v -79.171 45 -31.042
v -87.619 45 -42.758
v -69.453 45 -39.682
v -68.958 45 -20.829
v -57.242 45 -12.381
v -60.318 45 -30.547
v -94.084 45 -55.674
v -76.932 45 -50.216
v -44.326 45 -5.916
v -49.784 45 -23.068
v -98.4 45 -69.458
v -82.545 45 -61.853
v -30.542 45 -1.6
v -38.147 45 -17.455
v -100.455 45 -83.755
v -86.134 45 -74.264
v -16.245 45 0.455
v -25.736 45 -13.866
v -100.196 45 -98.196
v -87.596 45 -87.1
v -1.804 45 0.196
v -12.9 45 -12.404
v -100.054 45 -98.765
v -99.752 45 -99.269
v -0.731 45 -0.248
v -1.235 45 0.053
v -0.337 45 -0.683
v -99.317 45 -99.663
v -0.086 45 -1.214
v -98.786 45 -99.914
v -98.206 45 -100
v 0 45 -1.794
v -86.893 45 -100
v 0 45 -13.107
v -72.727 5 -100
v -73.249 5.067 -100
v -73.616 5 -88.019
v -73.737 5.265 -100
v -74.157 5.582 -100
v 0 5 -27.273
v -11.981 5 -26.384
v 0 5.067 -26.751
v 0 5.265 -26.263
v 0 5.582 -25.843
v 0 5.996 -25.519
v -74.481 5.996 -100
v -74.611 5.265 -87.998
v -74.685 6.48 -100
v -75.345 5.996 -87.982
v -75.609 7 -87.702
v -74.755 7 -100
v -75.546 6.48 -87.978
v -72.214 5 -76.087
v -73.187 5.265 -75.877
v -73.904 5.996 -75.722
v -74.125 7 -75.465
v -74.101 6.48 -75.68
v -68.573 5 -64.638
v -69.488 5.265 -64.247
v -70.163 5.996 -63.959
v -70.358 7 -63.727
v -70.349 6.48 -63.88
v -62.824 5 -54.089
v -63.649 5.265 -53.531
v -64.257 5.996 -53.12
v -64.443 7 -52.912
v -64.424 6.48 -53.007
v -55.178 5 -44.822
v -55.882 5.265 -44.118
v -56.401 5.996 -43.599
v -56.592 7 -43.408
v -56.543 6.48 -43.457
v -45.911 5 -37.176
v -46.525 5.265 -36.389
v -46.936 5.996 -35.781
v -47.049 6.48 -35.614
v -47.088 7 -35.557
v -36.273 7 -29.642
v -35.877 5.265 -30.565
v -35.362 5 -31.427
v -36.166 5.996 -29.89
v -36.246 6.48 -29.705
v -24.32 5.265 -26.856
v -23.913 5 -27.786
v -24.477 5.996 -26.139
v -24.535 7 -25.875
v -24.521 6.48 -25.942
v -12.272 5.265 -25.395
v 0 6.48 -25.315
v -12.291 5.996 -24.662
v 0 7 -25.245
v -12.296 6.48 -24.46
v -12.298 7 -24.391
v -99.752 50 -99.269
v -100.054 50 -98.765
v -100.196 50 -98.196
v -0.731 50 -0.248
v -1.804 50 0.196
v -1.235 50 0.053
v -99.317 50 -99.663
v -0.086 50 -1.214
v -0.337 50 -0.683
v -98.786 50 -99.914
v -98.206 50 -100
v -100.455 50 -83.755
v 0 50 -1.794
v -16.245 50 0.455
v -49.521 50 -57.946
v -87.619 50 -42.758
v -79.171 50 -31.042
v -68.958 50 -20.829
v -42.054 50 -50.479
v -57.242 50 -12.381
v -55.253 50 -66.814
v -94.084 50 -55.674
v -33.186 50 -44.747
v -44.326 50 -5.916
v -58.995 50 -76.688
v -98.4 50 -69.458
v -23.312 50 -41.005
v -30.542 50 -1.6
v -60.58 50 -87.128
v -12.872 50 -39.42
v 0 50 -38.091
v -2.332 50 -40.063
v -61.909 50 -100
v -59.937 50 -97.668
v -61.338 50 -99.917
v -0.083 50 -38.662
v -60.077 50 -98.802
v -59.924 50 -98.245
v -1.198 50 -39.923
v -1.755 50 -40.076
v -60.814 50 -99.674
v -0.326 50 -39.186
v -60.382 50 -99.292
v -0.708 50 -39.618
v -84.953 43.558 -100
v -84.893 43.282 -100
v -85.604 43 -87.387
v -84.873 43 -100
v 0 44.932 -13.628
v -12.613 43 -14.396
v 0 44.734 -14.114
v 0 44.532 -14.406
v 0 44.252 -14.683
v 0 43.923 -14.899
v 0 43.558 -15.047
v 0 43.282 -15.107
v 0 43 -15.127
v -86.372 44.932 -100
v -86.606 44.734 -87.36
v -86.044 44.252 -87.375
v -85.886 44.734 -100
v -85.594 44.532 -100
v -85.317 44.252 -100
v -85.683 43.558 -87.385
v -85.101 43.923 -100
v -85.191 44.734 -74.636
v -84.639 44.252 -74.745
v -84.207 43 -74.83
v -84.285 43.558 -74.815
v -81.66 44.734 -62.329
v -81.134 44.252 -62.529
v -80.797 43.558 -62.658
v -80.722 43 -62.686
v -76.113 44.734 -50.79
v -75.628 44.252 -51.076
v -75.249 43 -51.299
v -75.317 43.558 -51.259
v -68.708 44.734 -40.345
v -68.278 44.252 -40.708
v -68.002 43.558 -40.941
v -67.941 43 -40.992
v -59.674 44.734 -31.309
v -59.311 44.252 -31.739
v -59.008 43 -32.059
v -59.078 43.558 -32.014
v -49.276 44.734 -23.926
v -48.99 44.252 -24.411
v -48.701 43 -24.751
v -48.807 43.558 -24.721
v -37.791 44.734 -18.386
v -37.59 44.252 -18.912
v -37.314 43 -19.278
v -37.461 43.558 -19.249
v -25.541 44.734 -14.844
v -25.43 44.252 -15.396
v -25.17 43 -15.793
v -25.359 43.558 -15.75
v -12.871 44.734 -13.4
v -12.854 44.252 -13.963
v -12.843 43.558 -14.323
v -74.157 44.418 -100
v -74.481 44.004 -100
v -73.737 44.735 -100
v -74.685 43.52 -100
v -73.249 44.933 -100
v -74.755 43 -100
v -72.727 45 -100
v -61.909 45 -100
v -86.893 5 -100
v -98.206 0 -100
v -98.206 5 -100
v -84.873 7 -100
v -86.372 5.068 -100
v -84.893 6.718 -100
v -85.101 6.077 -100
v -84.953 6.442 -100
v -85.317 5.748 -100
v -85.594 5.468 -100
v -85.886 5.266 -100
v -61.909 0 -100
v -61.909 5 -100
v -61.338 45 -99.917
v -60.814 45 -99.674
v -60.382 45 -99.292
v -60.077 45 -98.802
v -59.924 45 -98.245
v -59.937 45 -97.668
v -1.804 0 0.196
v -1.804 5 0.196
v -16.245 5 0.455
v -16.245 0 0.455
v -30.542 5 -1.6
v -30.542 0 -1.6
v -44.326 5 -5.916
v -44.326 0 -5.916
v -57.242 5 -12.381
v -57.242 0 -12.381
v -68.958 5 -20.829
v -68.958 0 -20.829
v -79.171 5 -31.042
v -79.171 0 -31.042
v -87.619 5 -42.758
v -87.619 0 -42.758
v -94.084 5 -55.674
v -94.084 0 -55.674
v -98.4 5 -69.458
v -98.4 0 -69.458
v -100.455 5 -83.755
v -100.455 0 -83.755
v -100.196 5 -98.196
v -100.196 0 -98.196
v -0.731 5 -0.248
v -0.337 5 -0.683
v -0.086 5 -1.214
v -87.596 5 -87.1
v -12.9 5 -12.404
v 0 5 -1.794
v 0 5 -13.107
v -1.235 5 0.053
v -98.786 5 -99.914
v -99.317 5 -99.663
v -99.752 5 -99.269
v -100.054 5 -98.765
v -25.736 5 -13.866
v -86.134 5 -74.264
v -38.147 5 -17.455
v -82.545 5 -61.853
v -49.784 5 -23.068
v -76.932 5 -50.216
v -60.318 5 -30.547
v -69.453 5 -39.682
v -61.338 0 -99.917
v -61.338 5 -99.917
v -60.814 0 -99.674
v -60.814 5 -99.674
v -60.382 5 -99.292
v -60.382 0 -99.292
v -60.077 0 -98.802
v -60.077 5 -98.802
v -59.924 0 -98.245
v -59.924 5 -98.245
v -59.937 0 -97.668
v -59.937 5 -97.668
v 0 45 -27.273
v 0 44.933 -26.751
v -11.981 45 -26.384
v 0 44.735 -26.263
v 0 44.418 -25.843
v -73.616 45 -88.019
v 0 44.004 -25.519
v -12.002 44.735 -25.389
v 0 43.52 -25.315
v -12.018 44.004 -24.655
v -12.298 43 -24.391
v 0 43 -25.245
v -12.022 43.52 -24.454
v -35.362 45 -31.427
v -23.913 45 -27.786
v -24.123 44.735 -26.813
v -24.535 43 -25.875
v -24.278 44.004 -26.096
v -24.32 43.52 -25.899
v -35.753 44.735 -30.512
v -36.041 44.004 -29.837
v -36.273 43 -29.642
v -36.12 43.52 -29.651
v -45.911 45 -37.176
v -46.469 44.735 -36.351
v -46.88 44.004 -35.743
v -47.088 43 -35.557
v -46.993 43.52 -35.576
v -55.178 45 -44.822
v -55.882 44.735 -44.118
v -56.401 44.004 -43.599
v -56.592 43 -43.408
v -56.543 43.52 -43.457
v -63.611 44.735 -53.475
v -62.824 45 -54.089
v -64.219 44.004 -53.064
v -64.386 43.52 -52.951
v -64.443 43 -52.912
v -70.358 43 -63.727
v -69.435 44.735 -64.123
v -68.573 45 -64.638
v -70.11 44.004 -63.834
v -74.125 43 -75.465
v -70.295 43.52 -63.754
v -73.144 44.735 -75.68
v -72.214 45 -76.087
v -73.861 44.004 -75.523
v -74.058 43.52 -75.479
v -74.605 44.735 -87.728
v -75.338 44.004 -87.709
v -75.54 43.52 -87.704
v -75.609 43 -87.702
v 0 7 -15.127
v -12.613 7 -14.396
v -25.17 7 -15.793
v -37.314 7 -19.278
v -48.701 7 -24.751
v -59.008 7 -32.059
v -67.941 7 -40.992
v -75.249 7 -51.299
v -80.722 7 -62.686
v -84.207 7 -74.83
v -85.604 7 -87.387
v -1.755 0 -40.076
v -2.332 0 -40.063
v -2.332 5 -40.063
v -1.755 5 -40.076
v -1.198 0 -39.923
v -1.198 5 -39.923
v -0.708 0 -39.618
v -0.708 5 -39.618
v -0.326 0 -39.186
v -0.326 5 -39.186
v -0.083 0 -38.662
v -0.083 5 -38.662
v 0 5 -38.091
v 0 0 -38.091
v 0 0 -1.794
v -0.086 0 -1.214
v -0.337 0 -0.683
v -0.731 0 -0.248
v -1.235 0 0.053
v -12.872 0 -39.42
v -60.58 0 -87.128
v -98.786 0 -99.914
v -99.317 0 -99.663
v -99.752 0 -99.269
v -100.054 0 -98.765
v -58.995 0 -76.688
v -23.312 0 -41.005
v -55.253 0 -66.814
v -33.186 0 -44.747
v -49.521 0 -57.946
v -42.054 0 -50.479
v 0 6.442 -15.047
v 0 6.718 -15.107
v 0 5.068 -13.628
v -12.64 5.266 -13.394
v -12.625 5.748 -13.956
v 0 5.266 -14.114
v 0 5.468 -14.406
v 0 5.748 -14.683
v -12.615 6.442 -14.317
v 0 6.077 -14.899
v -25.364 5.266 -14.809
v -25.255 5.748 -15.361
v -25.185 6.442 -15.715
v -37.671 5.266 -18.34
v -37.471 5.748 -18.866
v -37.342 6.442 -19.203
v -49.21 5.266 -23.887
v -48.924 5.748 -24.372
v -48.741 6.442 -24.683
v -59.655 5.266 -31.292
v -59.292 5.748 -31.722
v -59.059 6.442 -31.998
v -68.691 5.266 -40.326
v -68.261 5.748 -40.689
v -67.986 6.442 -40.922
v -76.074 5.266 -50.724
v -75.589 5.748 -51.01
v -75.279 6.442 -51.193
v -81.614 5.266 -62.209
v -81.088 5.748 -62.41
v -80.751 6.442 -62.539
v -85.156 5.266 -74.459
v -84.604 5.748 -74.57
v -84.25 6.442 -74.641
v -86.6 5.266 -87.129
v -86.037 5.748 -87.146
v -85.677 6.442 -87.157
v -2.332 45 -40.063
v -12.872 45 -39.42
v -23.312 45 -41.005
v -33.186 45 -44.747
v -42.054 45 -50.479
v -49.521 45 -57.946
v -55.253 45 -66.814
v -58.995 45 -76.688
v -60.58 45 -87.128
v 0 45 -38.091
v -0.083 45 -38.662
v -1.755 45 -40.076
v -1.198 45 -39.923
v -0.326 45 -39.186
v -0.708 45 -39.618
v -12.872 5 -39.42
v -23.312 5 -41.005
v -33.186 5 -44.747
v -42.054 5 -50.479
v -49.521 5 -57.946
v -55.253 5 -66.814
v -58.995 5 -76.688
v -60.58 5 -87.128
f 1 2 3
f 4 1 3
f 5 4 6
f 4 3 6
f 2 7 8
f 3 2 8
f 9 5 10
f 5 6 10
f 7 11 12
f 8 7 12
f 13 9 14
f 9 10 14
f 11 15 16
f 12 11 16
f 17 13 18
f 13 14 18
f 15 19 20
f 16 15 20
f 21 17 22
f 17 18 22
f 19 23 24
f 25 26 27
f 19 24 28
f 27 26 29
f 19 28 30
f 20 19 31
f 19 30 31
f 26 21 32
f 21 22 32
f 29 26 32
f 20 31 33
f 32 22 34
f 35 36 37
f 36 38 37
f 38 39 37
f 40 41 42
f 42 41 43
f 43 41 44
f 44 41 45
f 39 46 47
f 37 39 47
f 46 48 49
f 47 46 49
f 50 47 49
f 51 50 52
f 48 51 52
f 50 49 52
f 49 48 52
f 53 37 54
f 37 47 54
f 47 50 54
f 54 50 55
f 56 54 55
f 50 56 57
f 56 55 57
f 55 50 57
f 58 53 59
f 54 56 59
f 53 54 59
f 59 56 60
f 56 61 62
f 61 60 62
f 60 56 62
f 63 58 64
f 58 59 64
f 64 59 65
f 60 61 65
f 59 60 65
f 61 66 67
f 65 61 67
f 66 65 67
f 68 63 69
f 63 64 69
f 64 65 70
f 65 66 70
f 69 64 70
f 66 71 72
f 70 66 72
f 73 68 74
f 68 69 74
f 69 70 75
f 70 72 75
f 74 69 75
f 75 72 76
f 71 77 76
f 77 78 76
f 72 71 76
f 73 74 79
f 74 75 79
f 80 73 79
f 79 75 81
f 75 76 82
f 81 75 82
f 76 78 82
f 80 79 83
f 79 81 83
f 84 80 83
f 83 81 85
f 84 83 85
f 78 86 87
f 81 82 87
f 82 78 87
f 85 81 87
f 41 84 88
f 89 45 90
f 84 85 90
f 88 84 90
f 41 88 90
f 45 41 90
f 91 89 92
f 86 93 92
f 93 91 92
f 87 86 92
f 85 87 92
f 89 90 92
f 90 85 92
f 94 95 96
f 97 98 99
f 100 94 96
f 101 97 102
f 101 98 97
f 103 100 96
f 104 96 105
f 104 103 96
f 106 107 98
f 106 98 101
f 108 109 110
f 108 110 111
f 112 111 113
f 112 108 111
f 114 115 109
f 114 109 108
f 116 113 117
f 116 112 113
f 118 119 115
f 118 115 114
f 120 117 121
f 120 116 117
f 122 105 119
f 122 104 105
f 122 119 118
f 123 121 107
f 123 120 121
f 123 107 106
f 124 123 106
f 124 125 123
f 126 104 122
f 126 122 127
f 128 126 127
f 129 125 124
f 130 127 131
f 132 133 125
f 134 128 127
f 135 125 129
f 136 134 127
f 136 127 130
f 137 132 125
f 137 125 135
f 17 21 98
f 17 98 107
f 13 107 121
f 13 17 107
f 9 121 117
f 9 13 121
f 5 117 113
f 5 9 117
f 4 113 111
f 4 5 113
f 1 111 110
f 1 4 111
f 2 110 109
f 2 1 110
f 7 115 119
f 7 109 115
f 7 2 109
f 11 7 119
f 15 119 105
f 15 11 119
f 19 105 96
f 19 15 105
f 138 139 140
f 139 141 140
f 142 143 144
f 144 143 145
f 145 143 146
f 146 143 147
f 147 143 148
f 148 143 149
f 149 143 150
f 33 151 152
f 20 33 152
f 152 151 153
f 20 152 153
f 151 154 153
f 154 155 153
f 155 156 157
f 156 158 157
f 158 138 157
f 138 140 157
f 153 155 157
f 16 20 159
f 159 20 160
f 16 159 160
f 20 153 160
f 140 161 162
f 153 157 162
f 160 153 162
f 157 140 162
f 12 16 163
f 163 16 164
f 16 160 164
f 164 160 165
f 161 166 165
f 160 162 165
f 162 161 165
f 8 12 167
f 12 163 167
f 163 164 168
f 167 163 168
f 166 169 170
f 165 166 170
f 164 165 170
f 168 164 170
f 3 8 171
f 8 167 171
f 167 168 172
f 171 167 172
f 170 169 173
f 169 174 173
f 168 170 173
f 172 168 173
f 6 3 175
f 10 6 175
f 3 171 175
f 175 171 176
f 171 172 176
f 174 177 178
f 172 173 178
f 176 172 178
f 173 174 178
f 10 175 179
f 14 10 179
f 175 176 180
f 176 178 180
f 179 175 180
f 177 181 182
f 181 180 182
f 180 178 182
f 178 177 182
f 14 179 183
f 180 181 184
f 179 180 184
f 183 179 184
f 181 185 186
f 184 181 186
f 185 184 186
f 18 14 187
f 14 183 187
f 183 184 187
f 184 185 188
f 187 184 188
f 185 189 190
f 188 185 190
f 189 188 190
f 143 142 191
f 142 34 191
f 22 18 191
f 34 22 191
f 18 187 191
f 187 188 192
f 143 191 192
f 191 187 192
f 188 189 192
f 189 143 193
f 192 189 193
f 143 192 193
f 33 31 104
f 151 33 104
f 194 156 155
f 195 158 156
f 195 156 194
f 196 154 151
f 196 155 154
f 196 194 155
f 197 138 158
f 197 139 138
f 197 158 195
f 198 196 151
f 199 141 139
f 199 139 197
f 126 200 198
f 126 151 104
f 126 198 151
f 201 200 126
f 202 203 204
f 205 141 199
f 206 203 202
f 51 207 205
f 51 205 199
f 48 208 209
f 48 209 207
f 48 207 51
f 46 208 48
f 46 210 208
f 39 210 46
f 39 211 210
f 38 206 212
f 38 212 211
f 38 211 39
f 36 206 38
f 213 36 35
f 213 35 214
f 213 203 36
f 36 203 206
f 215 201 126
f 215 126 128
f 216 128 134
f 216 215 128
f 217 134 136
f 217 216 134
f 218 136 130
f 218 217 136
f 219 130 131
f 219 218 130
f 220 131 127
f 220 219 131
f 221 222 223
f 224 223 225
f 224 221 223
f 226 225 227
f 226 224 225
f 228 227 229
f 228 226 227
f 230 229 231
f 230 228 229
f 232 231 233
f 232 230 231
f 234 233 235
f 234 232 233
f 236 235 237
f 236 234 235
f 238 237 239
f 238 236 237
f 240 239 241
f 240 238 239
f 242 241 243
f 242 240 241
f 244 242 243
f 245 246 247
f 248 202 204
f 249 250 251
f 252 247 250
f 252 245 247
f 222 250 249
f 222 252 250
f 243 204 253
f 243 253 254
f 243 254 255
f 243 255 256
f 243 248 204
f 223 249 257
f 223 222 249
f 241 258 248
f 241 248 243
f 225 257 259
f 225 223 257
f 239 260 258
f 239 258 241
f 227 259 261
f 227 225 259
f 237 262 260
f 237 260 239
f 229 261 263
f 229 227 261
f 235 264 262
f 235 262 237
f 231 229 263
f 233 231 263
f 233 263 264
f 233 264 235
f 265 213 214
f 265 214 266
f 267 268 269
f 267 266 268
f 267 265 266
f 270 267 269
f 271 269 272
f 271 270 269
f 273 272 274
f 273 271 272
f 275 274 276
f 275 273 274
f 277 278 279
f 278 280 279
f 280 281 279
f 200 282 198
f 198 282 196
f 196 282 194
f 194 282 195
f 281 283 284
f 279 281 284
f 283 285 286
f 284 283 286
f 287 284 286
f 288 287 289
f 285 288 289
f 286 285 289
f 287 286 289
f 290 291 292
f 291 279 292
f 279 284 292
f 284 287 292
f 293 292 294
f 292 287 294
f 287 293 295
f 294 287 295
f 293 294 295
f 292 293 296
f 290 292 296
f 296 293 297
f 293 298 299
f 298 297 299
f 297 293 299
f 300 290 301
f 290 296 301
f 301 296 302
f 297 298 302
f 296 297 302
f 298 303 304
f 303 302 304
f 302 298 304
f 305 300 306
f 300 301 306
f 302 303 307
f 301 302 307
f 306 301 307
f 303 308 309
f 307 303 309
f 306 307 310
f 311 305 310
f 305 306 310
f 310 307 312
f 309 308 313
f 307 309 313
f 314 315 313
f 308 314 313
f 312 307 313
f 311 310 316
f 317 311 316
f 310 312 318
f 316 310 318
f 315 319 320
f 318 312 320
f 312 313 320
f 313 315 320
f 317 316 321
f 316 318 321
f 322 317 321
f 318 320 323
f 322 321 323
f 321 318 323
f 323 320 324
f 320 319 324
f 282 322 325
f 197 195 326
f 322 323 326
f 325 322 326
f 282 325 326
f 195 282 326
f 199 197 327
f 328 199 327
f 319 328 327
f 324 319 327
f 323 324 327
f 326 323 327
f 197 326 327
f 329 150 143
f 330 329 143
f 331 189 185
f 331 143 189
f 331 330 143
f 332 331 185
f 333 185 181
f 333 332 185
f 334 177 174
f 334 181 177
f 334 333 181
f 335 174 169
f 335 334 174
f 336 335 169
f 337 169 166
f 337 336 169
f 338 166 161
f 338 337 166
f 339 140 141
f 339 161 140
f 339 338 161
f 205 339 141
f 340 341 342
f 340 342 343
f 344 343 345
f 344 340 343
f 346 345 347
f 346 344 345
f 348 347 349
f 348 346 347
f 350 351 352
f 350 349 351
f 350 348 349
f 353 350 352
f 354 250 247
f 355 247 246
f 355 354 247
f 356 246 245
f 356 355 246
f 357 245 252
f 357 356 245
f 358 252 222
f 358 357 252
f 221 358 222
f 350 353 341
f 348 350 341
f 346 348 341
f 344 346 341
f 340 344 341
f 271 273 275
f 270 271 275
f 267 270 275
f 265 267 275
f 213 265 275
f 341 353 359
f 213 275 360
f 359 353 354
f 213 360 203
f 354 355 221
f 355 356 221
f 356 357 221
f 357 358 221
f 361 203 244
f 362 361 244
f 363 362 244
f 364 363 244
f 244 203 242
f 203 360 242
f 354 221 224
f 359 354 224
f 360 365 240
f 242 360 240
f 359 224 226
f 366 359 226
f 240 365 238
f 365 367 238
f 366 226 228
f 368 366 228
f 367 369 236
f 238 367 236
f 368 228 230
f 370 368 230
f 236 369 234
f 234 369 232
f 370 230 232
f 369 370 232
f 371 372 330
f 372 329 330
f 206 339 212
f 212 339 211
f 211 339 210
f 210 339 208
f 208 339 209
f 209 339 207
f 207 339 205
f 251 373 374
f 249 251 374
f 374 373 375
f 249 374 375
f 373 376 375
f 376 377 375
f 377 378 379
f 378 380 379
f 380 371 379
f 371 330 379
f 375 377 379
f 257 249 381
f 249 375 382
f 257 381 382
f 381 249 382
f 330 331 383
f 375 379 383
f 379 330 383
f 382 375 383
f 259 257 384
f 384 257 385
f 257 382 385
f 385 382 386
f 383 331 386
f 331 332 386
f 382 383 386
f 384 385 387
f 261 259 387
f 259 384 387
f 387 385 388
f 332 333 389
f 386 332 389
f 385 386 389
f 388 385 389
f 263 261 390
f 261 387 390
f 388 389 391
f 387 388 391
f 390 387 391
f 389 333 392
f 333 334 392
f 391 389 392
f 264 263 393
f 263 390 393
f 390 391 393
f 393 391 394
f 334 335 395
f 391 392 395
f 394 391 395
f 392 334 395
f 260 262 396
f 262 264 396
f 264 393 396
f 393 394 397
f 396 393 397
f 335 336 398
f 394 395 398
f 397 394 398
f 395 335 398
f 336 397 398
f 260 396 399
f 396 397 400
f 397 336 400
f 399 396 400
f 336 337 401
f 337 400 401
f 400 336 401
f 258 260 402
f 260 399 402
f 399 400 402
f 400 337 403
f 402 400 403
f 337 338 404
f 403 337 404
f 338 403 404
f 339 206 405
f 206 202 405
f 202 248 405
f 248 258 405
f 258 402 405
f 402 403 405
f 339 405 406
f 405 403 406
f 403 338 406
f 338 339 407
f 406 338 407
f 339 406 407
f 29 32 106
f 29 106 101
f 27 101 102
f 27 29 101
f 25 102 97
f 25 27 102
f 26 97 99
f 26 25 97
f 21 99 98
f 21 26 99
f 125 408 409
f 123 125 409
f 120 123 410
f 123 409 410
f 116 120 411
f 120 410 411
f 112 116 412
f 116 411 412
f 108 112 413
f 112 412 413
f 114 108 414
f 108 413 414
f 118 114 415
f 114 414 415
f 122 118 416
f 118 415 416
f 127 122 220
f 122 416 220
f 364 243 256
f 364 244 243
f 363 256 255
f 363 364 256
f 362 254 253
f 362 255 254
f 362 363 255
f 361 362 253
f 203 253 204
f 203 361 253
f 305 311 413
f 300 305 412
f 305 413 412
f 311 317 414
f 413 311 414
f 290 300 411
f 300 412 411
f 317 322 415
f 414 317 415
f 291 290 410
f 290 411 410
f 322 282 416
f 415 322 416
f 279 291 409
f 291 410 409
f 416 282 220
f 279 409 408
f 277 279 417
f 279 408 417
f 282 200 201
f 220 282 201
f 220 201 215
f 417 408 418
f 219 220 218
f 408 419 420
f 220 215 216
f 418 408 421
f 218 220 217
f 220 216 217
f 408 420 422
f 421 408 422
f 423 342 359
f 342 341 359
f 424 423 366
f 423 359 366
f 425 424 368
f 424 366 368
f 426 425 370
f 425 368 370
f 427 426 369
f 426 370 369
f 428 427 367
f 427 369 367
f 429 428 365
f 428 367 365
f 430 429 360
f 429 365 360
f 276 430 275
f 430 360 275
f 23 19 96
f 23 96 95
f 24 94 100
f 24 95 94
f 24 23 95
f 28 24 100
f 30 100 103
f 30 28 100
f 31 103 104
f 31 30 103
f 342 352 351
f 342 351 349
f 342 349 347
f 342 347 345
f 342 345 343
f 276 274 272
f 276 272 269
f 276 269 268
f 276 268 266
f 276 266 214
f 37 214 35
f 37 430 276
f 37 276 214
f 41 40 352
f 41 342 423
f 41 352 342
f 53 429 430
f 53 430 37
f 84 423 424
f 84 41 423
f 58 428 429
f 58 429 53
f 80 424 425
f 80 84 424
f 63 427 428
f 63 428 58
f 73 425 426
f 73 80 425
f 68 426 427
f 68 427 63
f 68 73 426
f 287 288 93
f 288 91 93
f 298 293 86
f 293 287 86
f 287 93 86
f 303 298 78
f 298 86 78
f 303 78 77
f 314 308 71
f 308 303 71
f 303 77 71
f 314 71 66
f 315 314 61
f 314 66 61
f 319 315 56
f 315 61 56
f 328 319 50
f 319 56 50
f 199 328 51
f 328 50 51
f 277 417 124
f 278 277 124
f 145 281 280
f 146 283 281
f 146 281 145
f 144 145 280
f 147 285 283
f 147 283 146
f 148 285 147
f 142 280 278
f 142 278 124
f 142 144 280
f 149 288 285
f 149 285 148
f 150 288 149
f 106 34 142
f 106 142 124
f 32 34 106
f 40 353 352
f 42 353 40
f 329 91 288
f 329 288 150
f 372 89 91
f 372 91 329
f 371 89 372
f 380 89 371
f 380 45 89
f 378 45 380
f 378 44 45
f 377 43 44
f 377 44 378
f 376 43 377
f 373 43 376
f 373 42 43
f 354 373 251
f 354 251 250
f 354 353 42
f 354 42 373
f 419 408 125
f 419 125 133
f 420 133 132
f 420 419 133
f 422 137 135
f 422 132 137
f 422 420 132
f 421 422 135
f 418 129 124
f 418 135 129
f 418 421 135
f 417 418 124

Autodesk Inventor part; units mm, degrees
ref_plane "YZ Plane" through (0, 0, 0) normal (1, 0, 0) x (0, 1, 0)
ref_plane "XZ Plane" through (0, 0, 0) normal (0, 1, 0) x (-1, 0, 0)
ref_plane "XY Plane" through (0, 0, 0) normal (0, 0, 1) x (1, 0, 0)
sketch "Sketch1" plane through (0, 0, 0) normal (0, 1, 0) x (-1, 0, 0)
  line L0 (0, 0) -> (141.4214, 0) construction
  line L1 (100, 0) -> (0, 0)
  arc A0 (100.1961, -98.1961) -> (1.8039, 0.1961) centre (10.63, -89.37) ccw
  arc A1 (59.9366, -97.6681) -> (2.3319, -40.0634) centre (10.63, -89.37) ccw
  line L2 (98.2058, -100) -> (61.9088, -100)
  line L3 (0, -1.7942) -> (0, -38.0912)
  arc A2 (98.2058, -100) -> (100.1961, -98.1961) centre (98.2058, -98) ccw
  arc A3 (59.9366, -97.6681) -> (61.9088, -100) centre (61.9088, -98) ccw
  arc A4 (0, -38.0912) -> (2.3319, -40.0634) centre (2, -38.0912) ccw
  arc A5 (1.8039, 0.1961) -> (0, -1.7942) centre (2, -1.7942) ccw
  point P0 (100, -100)
  point P1 (59.4869, -100)
  point P2 (0, -40.5131)
  dimension "d2" = 100
  dimension "d3" = 90
  dimension "d4" = 40
  dimension "d7" = 2
extrude "Extrusion1" add sketch "Sketch1" along normal blind 5
sketch "Sketch2" plane through (0, 5, 0) normal (0, 1, 0) x (1, 0, 0)
  arc A0 (-98.2058, 100) -> (-100.1961, 98.1961) centre (-98.2058, 98) ccw projected
  arc A1 (-100.1961, 98.1961) -> (-1.8039, -0.1961) centre (-10.63, 89.37) ccw projected
  arc A2 (-1.8039, -0.1961) -> (0, 1.7942) centre (-2, 1.7942) ccw projected
  line L0 (0, 1.7942) -> (0, 38.0912) projected
  arc A3 (0, 38.0912) -> (-2.3319, 40.0634) centre (-2, 38.0912) ccw projected
  arc A4 (-59.9366, 97.6681) -> (-2.3319, 40.0634) centre (-10.63, 89.37) ccw projected
  arc A5 (-59.9366, 97.6681) -> (-61.9088, 100) centre (-61.9088, 98) ccw projected
  line L1 (-61.9088, 100) -> (-98.2058, 100) projected
  arc A6 (-84.8728, 100) -> (0, 15.1272) centre (-10.63, 89.37) ccw
  arc A7 (-74.7549, 100) -> (0, 25.2451) centre (-10.63, 89.37) ccw
  line L2 (0, 15.1272) -> (0, 25.2451)
  line L3 (-84.8728, 100) -> (-74.7549, 100)
  point P0 (0, 0)
  dimension "d10" = 15
extrude "Extrusion2" add sketch "Sketch2" along normal blind 40 contours L1 A7 L0 A6
fillet "Fillet1" radius 2 2 edges at (-63.663, 5, -36.337) (-56.5919, 5, -43.4081)
sketch "Sketch3" plane through (0, 45, 0) normal (0, 1, 0) x (1, 0, 0)
  arc A0 (-86.8927, 100) -> (0, 13.1073) centre (-10.63, 89.37) ccw projected
  line L0 (-86.8927, 100) -> (-98.2058, 100) projected
  arc A1 (-98.2058, 100) -> (-100.1961, 98.1961) centre (-98.2058, 98) ccw projected
  arc A2 (-100.1961, 98.1961) -> (-1.8039, -0.1961) centre (-10.63, 89.37) ccw projected
  arc A3 (-1.8039, -0.1961) -> (0, 1.7942) centre (-2, 1.7942) ccw projected
  line L1 (0, 1.7942) -> (0, 13.1073) projected
  arc A4 (-72.7267, 100) -> (0, 27.2733) centre (-10.63, 89.37) ccw projected
  line L2 (0, 27.2733) -> (0, 38.0912) projected
  arc A5 (0, 38.0912) -> (-2.3319, 40.0634) centre (-2, 38.0912) ccw projected
  arc A6 (-59.9366, 97.6681) -> (-2.3319, 40.0634) centre (-10.63, 89.37) ccw projected
  arc A7 (-59.9366, 97.6681) -> (-61.9088, 100) centre (-61.9088, 98) ccw projected
  line L3 (-61.9088, 100) -> (-72.7267, 100) projected
  arc A8 (-84.8728, 100) -> (0, 15.1272) centre (-10.63, 89.37) ccw projected
  line L4 (0, 15.1272) -> (0, 25.2451) projected
  arc A9 (-74.7549, 100) -> (0, 25.2451) centre (-10.63, 89.37) ccw projected
  line L5 (-74.7549, 100) -> (-84.8728, 100) projected
  arc A10 (-74.7549, 100) -> (0, 25.2451) centre (-10.63, 89.37) ccw projected
  arc A11 (-86.8927, 100) -> (0, 13.1073) centre (-10.63, 89.37) ccw projected
  line L6 (0, 27.2733) -> (0, 25.2451)
  line L7 (0, 15.1272) -> (0, 13.1073)
  line L8 (-72.7267, 100) -> (-74.7549, 100)
  line L9 (-74.7549, 100) -> (-84.8728, 100)
  line L10 (-86.8927, 100) -> (-84.8728, 100)
  point P0 (0, 0)
extrude "Extrusion3" add sketch "Sketch3" along normal blind 5
fillet "Fillet2" radius 2 2 edges at (-56.5919, 45, -43.4081) (-63.663, 45, -36.337)
properties part number "Curved 100mm"
